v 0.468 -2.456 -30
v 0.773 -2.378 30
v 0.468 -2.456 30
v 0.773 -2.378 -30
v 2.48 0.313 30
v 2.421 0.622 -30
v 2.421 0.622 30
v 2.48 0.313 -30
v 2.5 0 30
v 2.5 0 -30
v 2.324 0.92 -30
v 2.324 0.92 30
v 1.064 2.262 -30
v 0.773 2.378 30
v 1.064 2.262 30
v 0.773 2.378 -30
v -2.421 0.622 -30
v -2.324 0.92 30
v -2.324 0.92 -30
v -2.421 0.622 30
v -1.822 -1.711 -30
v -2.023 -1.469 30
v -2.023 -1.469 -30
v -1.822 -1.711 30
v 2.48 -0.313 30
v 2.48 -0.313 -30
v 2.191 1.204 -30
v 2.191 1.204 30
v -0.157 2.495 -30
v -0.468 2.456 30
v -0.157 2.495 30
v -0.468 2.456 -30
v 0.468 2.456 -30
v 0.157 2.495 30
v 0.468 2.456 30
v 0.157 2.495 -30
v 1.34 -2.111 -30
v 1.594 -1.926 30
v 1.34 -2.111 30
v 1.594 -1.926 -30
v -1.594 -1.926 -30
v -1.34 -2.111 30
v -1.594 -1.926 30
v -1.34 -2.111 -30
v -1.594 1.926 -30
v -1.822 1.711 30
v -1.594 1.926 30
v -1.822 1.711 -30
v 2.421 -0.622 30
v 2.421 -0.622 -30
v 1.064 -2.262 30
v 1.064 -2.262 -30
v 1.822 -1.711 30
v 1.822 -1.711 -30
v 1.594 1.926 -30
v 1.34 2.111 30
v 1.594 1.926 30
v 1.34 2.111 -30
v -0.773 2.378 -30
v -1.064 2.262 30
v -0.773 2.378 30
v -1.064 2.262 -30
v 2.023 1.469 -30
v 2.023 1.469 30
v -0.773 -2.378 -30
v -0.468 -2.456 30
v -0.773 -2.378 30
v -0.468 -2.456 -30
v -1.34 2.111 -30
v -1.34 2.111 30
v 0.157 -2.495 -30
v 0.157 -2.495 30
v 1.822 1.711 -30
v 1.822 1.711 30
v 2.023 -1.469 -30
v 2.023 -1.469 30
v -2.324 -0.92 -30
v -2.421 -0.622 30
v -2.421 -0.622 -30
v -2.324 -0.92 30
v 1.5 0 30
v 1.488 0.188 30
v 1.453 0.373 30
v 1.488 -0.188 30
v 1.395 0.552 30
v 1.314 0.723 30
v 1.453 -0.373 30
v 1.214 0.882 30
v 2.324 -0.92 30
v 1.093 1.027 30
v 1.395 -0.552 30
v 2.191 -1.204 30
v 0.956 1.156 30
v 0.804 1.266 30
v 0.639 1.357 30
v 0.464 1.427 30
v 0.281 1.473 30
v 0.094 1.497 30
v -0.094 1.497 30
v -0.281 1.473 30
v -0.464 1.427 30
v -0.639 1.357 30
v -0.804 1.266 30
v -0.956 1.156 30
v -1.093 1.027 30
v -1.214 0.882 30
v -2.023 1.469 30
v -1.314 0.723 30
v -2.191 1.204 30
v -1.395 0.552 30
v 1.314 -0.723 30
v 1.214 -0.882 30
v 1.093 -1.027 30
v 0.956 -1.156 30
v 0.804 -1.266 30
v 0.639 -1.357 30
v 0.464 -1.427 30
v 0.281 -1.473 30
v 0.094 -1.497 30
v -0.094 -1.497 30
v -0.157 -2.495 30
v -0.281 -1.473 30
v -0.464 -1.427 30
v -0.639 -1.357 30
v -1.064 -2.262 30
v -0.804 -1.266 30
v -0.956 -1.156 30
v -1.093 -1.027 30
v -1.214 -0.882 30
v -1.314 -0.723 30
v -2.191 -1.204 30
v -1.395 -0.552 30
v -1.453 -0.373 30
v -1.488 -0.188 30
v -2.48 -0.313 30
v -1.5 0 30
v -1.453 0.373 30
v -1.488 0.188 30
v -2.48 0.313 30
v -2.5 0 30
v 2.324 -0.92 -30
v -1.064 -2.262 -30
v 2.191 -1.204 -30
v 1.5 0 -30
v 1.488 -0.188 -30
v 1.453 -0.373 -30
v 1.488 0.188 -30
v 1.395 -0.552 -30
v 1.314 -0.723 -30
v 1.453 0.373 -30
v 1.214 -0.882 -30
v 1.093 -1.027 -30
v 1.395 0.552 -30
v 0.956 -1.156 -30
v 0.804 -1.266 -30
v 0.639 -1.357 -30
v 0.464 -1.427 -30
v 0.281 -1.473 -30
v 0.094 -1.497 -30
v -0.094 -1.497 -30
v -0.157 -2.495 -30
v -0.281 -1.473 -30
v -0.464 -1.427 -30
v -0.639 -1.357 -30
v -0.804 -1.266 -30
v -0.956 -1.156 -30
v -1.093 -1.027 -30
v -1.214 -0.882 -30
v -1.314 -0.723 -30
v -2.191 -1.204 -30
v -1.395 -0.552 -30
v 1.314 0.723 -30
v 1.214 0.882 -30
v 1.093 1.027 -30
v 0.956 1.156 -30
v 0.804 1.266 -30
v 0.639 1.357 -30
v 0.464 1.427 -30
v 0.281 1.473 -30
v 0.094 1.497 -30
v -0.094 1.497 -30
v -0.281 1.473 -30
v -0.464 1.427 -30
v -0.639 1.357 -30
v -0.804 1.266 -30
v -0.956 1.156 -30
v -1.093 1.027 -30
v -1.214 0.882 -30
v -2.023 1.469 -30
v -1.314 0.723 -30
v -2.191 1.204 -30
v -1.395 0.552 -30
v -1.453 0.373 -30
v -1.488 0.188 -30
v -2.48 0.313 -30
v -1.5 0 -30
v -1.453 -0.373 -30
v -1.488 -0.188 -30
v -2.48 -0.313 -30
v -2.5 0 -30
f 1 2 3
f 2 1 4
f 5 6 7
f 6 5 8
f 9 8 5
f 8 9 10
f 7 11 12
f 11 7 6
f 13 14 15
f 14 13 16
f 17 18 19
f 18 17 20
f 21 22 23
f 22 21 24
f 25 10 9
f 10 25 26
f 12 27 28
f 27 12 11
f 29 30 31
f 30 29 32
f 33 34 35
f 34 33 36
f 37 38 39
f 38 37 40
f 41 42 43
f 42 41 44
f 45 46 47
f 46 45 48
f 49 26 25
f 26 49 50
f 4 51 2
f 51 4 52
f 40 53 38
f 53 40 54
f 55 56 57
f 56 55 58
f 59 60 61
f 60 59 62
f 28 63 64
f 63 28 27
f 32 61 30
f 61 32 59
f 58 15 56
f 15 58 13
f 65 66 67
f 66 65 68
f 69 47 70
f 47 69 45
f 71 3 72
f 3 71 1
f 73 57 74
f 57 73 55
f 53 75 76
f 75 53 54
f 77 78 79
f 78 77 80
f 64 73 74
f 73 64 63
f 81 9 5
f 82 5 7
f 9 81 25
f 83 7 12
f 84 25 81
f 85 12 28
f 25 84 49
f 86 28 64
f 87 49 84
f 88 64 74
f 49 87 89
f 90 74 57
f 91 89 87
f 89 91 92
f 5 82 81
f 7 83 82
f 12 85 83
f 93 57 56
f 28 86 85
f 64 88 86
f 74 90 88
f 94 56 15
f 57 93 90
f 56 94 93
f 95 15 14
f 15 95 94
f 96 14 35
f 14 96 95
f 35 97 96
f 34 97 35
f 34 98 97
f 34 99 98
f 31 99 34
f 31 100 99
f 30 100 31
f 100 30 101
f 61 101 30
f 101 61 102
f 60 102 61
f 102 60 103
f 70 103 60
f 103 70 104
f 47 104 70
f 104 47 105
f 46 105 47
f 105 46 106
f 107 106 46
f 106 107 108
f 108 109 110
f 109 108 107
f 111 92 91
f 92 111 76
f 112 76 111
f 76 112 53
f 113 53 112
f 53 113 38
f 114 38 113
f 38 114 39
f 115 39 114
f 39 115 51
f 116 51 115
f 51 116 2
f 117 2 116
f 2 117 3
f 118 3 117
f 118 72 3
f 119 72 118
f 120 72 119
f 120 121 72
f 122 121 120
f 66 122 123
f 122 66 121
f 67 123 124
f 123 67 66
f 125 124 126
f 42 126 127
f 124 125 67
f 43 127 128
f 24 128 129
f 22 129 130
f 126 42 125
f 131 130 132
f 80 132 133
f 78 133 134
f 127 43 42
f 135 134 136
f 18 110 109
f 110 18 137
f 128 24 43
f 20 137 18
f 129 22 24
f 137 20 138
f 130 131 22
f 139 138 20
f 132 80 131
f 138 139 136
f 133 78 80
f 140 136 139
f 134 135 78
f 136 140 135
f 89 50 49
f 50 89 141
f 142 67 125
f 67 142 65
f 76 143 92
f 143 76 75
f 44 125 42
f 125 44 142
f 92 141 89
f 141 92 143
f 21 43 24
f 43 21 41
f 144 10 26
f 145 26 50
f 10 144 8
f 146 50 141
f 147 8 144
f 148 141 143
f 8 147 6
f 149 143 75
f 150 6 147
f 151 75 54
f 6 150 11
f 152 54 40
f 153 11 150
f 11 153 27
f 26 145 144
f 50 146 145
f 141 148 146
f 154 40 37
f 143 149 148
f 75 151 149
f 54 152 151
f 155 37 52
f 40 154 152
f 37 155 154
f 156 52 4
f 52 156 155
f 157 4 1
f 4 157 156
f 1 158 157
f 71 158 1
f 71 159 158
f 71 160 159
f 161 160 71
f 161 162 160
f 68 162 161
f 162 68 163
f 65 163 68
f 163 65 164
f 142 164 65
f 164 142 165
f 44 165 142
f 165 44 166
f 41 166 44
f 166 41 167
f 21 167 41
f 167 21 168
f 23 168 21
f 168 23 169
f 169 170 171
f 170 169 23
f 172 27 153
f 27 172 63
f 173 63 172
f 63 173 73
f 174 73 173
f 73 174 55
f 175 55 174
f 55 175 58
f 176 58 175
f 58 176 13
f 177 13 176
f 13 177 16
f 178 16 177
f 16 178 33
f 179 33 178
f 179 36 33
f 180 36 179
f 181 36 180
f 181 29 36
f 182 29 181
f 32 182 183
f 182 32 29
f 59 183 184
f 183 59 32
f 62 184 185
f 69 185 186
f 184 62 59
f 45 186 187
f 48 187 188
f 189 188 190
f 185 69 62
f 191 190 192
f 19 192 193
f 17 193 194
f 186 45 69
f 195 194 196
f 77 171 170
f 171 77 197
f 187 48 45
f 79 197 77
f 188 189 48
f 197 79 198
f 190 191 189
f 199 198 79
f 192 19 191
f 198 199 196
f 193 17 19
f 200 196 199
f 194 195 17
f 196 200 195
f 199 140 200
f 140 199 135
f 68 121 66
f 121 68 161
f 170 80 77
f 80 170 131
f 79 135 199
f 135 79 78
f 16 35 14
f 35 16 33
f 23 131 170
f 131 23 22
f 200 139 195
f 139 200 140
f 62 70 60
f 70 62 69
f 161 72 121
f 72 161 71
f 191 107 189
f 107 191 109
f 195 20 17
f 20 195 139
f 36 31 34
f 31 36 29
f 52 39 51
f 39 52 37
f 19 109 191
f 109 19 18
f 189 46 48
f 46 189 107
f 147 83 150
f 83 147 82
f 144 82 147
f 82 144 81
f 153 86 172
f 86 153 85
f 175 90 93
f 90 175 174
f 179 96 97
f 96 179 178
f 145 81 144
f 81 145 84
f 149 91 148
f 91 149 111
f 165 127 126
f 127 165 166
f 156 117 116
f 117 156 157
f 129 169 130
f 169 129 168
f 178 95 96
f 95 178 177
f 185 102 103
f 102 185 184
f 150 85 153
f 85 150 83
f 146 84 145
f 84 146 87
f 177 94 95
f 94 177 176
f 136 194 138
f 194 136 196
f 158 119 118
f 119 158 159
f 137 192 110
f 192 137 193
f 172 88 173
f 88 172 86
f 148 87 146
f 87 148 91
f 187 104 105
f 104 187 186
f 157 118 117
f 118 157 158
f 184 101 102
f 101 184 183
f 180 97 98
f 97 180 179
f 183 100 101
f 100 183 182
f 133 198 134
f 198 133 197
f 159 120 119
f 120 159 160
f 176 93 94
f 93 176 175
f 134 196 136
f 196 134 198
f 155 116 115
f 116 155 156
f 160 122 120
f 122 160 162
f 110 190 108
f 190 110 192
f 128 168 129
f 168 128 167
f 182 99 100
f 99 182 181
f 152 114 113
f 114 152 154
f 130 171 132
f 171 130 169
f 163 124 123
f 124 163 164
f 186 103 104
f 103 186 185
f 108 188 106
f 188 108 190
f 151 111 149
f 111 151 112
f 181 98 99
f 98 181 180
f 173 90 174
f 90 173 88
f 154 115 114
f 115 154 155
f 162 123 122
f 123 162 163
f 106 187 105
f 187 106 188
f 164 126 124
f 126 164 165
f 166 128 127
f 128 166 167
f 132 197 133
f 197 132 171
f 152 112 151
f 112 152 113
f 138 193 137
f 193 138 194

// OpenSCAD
$fn = 50;


difference() {
	union() {
		translate(v = [0, 0, -30.0000000000]) {
			cylinder(h = 60, r = 2.5000000000);
		}
	}
	union() {
		translate(v = [0, 0, -100.0000000000]) {
			cylinder(h = 200, r = 1.5000000000);
		}
	}
}
